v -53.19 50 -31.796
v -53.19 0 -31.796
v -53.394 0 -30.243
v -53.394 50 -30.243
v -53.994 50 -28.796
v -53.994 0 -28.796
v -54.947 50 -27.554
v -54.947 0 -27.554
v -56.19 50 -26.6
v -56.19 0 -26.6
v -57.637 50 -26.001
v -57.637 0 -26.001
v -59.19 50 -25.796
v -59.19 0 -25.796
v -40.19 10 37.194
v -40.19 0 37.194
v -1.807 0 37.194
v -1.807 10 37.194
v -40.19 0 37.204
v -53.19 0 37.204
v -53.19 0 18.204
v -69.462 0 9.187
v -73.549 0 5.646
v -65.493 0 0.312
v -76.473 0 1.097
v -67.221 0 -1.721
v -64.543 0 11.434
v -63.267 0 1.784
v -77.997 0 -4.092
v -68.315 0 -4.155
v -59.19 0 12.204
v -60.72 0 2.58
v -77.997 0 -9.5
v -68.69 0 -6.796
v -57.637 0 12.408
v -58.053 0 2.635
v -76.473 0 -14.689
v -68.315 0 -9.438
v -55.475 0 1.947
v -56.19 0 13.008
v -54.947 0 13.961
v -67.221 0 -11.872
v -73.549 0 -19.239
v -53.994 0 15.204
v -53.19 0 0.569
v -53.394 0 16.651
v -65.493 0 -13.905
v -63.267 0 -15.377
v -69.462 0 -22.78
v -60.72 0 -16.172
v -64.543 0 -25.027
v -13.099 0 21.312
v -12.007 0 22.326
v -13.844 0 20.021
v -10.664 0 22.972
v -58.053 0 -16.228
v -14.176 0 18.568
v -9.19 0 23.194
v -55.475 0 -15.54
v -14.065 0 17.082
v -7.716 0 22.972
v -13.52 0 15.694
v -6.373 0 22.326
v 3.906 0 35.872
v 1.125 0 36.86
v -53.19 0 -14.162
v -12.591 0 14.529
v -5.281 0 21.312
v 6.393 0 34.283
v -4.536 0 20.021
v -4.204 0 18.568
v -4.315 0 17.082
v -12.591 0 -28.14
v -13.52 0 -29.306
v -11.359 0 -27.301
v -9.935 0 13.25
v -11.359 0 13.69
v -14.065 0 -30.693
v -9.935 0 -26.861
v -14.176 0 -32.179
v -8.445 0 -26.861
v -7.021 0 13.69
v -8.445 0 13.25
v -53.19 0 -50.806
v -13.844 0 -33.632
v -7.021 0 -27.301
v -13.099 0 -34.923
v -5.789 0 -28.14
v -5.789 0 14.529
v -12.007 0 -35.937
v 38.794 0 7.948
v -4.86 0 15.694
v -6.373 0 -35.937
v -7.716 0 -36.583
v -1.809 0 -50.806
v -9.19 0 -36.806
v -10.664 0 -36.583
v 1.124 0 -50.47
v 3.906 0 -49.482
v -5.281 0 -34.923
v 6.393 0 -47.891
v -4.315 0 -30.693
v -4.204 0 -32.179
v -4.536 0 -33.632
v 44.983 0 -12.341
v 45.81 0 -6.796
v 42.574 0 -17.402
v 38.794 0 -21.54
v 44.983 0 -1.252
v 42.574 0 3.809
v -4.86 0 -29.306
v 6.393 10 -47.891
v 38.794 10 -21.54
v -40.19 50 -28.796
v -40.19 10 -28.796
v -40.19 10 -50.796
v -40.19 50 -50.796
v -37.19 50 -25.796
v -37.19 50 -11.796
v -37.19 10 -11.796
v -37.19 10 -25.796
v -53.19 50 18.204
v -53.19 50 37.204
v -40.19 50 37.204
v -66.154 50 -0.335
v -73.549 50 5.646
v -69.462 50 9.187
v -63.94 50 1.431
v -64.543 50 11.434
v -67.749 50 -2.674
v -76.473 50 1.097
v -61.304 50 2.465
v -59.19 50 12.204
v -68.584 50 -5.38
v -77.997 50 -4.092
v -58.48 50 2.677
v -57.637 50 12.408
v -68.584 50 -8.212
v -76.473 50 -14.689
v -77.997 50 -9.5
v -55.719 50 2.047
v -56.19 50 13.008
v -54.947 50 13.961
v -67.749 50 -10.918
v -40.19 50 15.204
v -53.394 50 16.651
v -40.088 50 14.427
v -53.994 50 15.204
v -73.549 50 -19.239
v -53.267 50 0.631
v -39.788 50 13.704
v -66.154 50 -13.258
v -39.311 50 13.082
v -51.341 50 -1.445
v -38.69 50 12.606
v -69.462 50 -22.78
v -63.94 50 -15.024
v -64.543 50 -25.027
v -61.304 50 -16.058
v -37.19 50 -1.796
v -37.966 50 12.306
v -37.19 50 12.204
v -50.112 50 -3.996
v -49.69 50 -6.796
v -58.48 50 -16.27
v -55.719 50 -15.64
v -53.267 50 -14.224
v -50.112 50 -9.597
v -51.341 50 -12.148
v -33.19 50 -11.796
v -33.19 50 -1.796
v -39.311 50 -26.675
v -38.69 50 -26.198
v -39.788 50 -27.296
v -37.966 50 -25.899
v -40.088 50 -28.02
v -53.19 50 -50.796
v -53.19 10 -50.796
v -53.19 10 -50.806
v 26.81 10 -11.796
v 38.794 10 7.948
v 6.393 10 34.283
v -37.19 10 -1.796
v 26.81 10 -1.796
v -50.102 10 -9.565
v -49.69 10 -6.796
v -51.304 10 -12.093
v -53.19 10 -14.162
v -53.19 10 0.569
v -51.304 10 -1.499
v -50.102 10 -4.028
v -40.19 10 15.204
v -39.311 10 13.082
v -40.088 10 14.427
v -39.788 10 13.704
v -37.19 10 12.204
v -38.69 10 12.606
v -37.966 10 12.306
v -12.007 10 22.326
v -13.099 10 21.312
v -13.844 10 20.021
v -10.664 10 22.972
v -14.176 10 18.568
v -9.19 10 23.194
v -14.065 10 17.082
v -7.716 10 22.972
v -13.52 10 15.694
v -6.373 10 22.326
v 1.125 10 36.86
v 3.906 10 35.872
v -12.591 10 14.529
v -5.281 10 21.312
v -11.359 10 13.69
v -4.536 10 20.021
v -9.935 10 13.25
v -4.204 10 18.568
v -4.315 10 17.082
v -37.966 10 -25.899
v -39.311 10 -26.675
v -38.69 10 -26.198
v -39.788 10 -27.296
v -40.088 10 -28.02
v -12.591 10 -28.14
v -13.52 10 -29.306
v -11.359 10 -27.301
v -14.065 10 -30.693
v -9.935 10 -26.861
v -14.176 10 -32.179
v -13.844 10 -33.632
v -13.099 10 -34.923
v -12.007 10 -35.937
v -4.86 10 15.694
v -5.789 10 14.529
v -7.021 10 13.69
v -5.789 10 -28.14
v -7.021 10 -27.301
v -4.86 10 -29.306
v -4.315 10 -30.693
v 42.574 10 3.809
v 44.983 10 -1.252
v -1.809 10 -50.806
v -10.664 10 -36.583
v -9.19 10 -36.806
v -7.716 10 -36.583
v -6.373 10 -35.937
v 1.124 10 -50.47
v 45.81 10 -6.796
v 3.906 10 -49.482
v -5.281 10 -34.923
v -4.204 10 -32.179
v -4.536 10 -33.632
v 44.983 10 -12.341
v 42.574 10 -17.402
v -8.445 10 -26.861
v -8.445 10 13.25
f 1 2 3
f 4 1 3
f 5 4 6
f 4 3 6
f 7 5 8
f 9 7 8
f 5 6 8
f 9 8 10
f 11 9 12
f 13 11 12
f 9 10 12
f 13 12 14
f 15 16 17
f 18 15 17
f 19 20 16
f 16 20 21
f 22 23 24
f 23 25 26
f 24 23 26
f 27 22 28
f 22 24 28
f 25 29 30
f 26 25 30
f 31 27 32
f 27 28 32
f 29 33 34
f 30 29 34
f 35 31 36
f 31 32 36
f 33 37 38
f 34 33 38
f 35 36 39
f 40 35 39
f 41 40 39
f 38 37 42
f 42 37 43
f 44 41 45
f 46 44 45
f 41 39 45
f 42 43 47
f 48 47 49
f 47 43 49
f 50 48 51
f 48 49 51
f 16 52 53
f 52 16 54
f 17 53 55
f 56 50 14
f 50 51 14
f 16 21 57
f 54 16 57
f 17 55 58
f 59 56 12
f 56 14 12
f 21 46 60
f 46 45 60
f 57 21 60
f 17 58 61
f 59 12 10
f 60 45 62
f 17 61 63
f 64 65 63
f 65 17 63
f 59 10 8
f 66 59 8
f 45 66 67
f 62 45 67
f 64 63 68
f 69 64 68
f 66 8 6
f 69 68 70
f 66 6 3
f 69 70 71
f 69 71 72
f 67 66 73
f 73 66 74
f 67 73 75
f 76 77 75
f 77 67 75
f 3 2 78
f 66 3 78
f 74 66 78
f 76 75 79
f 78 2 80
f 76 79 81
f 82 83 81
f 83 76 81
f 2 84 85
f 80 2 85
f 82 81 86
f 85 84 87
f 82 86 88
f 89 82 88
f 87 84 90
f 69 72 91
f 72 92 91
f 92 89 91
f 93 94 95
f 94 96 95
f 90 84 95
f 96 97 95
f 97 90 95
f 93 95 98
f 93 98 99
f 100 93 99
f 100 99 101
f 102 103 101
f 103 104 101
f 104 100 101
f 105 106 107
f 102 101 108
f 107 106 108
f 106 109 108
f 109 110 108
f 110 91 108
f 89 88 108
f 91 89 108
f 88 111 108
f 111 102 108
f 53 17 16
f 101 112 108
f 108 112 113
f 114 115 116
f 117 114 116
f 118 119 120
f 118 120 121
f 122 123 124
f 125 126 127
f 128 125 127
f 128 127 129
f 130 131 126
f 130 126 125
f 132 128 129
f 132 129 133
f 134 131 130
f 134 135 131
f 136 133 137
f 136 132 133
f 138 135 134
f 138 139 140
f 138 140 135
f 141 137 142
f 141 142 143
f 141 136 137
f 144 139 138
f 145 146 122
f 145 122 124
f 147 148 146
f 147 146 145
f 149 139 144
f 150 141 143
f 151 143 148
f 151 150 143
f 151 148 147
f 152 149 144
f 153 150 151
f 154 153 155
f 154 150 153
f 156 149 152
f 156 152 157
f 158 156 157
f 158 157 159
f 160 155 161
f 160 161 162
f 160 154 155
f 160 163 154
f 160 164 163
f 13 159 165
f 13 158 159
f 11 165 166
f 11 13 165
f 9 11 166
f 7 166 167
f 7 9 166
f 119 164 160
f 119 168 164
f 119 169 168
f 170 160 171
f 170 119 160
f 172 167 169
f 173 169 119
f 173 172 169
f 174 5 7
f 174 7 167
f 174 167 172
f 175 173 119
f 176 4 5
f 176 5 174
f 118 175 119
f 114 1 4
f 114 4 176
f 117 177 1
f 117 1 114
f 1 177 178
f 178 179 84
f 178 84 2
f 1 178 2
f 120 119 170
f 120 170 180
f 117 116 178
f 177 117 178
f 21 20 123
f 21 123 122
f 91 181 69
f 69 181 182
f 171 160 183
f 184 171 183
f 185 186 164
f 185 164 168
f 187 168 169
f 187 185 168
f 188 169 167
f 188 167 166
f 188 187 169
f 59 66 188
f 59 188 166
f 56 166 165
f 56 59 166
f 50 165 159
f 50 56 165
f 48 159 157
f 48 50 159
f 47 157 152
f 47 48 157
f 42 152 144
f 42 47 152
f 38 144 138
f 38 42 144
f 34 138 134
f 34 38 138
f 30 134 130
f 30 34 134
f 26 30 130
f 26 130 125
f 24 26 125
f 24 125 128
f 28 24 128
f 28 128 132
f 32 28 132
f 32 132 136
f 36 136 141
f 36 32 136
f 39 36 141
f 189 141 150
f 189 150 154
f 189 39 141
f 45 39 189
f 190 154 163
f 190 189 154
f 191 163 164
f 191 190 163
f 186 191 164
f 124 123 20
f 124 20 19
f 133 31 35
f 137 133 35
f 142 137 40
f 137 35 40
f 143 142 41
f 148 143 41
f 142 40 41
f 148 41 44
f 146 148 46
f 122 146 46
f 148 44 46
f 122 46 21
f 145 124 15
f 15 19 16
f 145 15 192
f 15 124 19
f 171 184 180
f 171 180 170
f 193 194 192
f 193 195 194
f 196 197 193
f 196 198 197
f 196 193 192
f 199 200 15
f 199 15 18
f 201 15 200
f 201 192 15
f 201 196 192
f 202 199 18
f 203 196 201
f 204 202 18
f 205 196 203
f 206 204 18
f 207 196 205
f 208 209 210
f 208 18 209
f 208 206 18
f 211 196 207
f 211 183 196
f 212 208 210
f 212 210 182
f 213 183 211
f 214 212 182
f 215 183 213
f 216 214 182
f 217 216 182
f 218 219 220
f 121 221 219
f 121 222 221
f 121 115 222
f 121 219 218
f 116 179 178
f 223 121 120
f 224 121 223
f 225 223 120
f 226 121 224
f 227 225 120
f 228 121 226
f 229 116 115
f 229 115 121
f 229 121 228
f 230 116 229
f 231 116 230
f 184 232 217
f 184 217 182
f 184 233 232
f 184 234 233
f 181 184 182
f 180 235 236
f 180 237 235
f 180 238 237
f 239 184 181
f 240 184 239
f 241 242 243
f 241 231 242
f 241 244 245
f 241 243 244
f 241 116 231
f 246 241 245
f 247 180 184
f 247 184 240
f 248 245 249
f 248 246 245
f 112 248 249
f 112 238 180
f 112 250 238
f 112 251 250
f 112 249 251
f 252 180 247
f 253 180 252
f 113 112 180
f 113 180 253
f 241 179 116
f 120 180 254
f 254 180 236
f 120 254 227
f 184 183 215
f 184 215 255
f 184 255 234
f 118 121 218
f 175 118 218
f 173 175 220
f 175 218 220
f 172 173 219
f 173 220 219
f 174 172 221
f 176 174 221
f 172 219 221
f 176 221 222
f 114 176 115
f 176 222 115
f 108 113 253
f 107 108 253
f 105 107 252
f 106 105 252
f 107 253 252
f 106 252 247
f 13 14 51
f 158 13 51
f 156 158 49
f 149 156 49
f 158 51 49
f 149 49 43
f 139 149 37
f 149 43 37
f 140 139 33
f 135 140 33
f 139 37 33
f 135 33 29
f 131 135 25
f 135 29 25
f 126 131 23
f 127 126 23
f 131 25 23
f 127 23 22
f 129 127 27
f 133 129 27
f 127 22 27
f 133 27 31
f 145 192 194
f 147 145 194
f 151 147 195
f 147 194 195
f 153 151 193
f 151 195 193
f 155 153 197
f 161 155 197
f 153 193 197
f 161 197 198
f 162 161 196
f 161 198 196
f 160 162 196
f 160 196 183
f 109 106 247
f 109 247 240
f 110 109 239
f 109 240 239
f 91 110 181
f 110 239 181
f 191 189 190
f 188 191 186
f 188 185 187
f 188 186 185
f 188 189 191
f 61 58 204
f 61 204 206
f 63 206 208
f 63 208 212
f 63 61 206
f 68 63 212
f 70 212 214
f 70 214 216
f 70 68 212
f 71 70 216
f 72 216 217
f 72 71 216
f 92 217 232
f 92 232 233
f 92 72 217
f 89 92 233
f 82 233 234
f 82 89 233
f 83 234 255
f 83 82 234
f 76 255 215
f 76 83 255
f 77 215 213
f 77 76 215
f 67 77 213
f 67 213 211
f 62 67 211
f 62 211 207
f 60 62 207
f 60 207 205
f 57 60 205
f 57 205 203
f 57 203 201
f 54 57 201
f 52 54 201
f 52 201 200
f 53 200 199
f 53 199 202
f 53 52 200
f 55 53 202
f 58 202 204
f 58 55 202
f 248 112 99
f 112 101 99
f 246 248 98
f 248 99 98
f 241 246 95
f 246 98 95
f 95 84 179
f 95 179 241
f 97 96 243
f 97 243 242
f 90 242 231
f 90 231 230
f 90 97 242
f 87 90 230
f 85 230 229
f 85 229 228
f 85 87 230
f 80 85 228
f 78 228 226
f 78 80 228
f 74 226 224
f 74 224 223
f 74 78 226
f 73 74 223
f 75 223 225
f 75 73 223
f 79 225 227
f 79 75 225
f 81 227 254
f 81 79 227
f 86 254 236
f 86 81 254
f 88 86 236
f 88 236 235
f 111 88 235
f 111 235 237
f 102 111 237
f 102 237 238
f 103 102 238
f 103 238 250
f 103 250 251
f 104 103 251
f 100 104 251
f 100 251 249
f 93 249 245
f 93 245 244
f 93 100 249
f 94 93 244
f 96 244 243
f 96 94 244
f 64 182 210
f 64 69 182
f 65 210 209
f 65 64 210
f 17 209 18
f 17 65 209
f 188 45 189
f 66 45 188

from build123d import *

# Parameters (mm, degrees)
SKETCH1_W               = 99
SKETCH1_H               = 88
SKETCH1_R               = 5
BOSS_EXTRUDE1_DEPTH     = 10
BOSS_EXTRUDE2_OUTLINE_R = 9.5
BOSS_EXTRUDE2_DEPTH     = 50
BOSS_EXTRUDE3_DEPTH     = 5
CUT_EXTRUDE3_DEPTH      = 10
FILLET1_R               = 13
FILLET2_R               = 13


# Read off the part's stored shape, not the designer's step: Boss-Extrude2
with BuildPart() as part:
    # Sketch1 → Boss-Extrude1 (new body)
    with BuildSketch(Plane(origin=(0, 0, 0), x_dir=(1, 0, 0), z_dir=(0, 1, 0))):
        with Locations((-3.690036969, 6.805517627)):
            Rectangle(SKETCH1_W, SKETCH1_H)
        with Locations(Location((-9.190036969, -18.194482373, 0), (0, 0, 270))):
            Circle(SKETCH1_R, mode=Mode.SUBTRACT)
        with Locations(Location((-9.190036969, 31.805517627, 0), (0, 0, 90))):
            Circle(SKETCH1_R, mode=Mode.SUBTRACT)
    extrude(amount=BOSS_EXTRUDE1_DEPTH)

    # Boss-Extrude2 outline → Boss-Extrude2 (add)
    with BuildSketch(Plane(origin=(0, 0, 0), x_dir=(1, 0, 0), z_dir=(0, 1, 0))):
        with BuildLine():
            ThreePointArc((-59.190036969, -12.203665814), (-54.947396282, -13.961025127), (-53.190036969, -18.203665814))
            Line((-53.190036969, -18.203665814), (-53.190036969, -37.203665814))
            Line((-53.190036969, -37.203665814), (-40.190036969, -37.203665814))
            Line((-40.190036969, -37.203665814), (-40.190036969, -15.203665814))
            ThreePointArc((-40.190036969, -15.203665814), (-39.311357313, -13.08234547), (-37.190036969, -12.203665814))
            Line((-37.190036969, -12.203665814), (-37.190036969, 1.796334186))
            Line((-37.190036969, 1.796334186), (-33.190036969, 1.796334186))
            Line((-33.190036969, 1.796334186), (-33.190036969, 11.796334186))
            Line((-33.190036969, 11.796334186), (-37.190036969, 11.796334186))
            Line((-37.190036969, 11.796334186), (-37.190036969, 25.796334186))
            ThreePointArc((-37.190036969, 25.796334186), (-39.311357313, 26.675013842), (-40.190036969, 28.796334186))
            Line((-40.190036969, 28.796334186), (-40.190036969, 50.796334186))
            Line((-40.190036969, 50.796334186), (-53.190036969, 50.796334186))
            Line((-53.190036969, 50.796334186), (-53.190036969, 31.796334186))
            ThreePointArc((-53.190036969, 31.796334186), (-54.947396282, 27.553693499), (-59.190036969, 25.796334186))
            ThreePointArc((-59.190036969, 25.796334186), (-78.190036969, 6.796334186), (-59.190036969, -12.203665814))
        make_face()
        with Locations((-59.190036969, 6.796334186)):
            Circle(BOSS_EXTRUDE2_OUTLINE_R, mode=Mode.SUBTRACT)
    extrude(amount=BOSS_EXTRUDE2_DEPTH)

    # 3DSketch2 → Boss-Extrude3 (add, symmetric)
    with BuildSketch(Plane(origin=(-33.190036969, 10, -6.796334186), x_dir=(1, 0, 0), z_dir=(0, 0, 1))):
        Polygon((0, 0), (60, 0), (0, 40), align=None)
    extrude(amount=BOSS_EXTRUDE3_DEPTH, both=True)

    # Sketch2 → Cut-Extrude3 (cut)
    with BuildSketch(Plane(origin=(0, 10, 0), x_dir=(1, 0, 0), z_dir=(0, 1, 0))):
        with BuildLine():
            ThreePointArc((38.793742347, 21.540492879), (43.966474405, 14.960601333), (45.809963031, 6.796430868))
            Line((45.809963031, 6.796430868), (45.809963031, 50.805517627))
            Line((45.809963031, 50.805517627), (2.809963031, 50.805517627))
            Line((2.809963031, 50.805517627), (38.793742347, 21.540492879))
        make_face()
        with BuildLine():
            Line((38.793742347, -7.947631063), (2.809963031, -37.194482373))
            Line((2.809963031, -37.194482373), (45.809963031, -37.194482373))
            Line((45.809963031, -37.194482373), (45.809963031, 6.796430868))
            ThreePointArc((45.809963031, 6.796430868), (43.966474387, -1.367739553), (38.793742347, -7.947631063))
        make_face()
    extrude(amount=-CUT_EXTRUDE3_DEPTH, mode=Mode.SUBTRACT)

    # Fillet1
    fillet1_edges = [part.edges().sort_by_distance(p)[0] for p in [
        (2.809963031, 5, 37.194482373),
    ]]
    fillet(fillet1_edges, radius=FILLET1_R)

    # Fillet2
    fillet2_edges = [part.edges().sort_by_distance(p)[0] for p in [
        (2.809963031, 5, -50.805517627),
    ]]
    fillet(fillet2_edges, radius=FILLET2_R)


solid = part.part
